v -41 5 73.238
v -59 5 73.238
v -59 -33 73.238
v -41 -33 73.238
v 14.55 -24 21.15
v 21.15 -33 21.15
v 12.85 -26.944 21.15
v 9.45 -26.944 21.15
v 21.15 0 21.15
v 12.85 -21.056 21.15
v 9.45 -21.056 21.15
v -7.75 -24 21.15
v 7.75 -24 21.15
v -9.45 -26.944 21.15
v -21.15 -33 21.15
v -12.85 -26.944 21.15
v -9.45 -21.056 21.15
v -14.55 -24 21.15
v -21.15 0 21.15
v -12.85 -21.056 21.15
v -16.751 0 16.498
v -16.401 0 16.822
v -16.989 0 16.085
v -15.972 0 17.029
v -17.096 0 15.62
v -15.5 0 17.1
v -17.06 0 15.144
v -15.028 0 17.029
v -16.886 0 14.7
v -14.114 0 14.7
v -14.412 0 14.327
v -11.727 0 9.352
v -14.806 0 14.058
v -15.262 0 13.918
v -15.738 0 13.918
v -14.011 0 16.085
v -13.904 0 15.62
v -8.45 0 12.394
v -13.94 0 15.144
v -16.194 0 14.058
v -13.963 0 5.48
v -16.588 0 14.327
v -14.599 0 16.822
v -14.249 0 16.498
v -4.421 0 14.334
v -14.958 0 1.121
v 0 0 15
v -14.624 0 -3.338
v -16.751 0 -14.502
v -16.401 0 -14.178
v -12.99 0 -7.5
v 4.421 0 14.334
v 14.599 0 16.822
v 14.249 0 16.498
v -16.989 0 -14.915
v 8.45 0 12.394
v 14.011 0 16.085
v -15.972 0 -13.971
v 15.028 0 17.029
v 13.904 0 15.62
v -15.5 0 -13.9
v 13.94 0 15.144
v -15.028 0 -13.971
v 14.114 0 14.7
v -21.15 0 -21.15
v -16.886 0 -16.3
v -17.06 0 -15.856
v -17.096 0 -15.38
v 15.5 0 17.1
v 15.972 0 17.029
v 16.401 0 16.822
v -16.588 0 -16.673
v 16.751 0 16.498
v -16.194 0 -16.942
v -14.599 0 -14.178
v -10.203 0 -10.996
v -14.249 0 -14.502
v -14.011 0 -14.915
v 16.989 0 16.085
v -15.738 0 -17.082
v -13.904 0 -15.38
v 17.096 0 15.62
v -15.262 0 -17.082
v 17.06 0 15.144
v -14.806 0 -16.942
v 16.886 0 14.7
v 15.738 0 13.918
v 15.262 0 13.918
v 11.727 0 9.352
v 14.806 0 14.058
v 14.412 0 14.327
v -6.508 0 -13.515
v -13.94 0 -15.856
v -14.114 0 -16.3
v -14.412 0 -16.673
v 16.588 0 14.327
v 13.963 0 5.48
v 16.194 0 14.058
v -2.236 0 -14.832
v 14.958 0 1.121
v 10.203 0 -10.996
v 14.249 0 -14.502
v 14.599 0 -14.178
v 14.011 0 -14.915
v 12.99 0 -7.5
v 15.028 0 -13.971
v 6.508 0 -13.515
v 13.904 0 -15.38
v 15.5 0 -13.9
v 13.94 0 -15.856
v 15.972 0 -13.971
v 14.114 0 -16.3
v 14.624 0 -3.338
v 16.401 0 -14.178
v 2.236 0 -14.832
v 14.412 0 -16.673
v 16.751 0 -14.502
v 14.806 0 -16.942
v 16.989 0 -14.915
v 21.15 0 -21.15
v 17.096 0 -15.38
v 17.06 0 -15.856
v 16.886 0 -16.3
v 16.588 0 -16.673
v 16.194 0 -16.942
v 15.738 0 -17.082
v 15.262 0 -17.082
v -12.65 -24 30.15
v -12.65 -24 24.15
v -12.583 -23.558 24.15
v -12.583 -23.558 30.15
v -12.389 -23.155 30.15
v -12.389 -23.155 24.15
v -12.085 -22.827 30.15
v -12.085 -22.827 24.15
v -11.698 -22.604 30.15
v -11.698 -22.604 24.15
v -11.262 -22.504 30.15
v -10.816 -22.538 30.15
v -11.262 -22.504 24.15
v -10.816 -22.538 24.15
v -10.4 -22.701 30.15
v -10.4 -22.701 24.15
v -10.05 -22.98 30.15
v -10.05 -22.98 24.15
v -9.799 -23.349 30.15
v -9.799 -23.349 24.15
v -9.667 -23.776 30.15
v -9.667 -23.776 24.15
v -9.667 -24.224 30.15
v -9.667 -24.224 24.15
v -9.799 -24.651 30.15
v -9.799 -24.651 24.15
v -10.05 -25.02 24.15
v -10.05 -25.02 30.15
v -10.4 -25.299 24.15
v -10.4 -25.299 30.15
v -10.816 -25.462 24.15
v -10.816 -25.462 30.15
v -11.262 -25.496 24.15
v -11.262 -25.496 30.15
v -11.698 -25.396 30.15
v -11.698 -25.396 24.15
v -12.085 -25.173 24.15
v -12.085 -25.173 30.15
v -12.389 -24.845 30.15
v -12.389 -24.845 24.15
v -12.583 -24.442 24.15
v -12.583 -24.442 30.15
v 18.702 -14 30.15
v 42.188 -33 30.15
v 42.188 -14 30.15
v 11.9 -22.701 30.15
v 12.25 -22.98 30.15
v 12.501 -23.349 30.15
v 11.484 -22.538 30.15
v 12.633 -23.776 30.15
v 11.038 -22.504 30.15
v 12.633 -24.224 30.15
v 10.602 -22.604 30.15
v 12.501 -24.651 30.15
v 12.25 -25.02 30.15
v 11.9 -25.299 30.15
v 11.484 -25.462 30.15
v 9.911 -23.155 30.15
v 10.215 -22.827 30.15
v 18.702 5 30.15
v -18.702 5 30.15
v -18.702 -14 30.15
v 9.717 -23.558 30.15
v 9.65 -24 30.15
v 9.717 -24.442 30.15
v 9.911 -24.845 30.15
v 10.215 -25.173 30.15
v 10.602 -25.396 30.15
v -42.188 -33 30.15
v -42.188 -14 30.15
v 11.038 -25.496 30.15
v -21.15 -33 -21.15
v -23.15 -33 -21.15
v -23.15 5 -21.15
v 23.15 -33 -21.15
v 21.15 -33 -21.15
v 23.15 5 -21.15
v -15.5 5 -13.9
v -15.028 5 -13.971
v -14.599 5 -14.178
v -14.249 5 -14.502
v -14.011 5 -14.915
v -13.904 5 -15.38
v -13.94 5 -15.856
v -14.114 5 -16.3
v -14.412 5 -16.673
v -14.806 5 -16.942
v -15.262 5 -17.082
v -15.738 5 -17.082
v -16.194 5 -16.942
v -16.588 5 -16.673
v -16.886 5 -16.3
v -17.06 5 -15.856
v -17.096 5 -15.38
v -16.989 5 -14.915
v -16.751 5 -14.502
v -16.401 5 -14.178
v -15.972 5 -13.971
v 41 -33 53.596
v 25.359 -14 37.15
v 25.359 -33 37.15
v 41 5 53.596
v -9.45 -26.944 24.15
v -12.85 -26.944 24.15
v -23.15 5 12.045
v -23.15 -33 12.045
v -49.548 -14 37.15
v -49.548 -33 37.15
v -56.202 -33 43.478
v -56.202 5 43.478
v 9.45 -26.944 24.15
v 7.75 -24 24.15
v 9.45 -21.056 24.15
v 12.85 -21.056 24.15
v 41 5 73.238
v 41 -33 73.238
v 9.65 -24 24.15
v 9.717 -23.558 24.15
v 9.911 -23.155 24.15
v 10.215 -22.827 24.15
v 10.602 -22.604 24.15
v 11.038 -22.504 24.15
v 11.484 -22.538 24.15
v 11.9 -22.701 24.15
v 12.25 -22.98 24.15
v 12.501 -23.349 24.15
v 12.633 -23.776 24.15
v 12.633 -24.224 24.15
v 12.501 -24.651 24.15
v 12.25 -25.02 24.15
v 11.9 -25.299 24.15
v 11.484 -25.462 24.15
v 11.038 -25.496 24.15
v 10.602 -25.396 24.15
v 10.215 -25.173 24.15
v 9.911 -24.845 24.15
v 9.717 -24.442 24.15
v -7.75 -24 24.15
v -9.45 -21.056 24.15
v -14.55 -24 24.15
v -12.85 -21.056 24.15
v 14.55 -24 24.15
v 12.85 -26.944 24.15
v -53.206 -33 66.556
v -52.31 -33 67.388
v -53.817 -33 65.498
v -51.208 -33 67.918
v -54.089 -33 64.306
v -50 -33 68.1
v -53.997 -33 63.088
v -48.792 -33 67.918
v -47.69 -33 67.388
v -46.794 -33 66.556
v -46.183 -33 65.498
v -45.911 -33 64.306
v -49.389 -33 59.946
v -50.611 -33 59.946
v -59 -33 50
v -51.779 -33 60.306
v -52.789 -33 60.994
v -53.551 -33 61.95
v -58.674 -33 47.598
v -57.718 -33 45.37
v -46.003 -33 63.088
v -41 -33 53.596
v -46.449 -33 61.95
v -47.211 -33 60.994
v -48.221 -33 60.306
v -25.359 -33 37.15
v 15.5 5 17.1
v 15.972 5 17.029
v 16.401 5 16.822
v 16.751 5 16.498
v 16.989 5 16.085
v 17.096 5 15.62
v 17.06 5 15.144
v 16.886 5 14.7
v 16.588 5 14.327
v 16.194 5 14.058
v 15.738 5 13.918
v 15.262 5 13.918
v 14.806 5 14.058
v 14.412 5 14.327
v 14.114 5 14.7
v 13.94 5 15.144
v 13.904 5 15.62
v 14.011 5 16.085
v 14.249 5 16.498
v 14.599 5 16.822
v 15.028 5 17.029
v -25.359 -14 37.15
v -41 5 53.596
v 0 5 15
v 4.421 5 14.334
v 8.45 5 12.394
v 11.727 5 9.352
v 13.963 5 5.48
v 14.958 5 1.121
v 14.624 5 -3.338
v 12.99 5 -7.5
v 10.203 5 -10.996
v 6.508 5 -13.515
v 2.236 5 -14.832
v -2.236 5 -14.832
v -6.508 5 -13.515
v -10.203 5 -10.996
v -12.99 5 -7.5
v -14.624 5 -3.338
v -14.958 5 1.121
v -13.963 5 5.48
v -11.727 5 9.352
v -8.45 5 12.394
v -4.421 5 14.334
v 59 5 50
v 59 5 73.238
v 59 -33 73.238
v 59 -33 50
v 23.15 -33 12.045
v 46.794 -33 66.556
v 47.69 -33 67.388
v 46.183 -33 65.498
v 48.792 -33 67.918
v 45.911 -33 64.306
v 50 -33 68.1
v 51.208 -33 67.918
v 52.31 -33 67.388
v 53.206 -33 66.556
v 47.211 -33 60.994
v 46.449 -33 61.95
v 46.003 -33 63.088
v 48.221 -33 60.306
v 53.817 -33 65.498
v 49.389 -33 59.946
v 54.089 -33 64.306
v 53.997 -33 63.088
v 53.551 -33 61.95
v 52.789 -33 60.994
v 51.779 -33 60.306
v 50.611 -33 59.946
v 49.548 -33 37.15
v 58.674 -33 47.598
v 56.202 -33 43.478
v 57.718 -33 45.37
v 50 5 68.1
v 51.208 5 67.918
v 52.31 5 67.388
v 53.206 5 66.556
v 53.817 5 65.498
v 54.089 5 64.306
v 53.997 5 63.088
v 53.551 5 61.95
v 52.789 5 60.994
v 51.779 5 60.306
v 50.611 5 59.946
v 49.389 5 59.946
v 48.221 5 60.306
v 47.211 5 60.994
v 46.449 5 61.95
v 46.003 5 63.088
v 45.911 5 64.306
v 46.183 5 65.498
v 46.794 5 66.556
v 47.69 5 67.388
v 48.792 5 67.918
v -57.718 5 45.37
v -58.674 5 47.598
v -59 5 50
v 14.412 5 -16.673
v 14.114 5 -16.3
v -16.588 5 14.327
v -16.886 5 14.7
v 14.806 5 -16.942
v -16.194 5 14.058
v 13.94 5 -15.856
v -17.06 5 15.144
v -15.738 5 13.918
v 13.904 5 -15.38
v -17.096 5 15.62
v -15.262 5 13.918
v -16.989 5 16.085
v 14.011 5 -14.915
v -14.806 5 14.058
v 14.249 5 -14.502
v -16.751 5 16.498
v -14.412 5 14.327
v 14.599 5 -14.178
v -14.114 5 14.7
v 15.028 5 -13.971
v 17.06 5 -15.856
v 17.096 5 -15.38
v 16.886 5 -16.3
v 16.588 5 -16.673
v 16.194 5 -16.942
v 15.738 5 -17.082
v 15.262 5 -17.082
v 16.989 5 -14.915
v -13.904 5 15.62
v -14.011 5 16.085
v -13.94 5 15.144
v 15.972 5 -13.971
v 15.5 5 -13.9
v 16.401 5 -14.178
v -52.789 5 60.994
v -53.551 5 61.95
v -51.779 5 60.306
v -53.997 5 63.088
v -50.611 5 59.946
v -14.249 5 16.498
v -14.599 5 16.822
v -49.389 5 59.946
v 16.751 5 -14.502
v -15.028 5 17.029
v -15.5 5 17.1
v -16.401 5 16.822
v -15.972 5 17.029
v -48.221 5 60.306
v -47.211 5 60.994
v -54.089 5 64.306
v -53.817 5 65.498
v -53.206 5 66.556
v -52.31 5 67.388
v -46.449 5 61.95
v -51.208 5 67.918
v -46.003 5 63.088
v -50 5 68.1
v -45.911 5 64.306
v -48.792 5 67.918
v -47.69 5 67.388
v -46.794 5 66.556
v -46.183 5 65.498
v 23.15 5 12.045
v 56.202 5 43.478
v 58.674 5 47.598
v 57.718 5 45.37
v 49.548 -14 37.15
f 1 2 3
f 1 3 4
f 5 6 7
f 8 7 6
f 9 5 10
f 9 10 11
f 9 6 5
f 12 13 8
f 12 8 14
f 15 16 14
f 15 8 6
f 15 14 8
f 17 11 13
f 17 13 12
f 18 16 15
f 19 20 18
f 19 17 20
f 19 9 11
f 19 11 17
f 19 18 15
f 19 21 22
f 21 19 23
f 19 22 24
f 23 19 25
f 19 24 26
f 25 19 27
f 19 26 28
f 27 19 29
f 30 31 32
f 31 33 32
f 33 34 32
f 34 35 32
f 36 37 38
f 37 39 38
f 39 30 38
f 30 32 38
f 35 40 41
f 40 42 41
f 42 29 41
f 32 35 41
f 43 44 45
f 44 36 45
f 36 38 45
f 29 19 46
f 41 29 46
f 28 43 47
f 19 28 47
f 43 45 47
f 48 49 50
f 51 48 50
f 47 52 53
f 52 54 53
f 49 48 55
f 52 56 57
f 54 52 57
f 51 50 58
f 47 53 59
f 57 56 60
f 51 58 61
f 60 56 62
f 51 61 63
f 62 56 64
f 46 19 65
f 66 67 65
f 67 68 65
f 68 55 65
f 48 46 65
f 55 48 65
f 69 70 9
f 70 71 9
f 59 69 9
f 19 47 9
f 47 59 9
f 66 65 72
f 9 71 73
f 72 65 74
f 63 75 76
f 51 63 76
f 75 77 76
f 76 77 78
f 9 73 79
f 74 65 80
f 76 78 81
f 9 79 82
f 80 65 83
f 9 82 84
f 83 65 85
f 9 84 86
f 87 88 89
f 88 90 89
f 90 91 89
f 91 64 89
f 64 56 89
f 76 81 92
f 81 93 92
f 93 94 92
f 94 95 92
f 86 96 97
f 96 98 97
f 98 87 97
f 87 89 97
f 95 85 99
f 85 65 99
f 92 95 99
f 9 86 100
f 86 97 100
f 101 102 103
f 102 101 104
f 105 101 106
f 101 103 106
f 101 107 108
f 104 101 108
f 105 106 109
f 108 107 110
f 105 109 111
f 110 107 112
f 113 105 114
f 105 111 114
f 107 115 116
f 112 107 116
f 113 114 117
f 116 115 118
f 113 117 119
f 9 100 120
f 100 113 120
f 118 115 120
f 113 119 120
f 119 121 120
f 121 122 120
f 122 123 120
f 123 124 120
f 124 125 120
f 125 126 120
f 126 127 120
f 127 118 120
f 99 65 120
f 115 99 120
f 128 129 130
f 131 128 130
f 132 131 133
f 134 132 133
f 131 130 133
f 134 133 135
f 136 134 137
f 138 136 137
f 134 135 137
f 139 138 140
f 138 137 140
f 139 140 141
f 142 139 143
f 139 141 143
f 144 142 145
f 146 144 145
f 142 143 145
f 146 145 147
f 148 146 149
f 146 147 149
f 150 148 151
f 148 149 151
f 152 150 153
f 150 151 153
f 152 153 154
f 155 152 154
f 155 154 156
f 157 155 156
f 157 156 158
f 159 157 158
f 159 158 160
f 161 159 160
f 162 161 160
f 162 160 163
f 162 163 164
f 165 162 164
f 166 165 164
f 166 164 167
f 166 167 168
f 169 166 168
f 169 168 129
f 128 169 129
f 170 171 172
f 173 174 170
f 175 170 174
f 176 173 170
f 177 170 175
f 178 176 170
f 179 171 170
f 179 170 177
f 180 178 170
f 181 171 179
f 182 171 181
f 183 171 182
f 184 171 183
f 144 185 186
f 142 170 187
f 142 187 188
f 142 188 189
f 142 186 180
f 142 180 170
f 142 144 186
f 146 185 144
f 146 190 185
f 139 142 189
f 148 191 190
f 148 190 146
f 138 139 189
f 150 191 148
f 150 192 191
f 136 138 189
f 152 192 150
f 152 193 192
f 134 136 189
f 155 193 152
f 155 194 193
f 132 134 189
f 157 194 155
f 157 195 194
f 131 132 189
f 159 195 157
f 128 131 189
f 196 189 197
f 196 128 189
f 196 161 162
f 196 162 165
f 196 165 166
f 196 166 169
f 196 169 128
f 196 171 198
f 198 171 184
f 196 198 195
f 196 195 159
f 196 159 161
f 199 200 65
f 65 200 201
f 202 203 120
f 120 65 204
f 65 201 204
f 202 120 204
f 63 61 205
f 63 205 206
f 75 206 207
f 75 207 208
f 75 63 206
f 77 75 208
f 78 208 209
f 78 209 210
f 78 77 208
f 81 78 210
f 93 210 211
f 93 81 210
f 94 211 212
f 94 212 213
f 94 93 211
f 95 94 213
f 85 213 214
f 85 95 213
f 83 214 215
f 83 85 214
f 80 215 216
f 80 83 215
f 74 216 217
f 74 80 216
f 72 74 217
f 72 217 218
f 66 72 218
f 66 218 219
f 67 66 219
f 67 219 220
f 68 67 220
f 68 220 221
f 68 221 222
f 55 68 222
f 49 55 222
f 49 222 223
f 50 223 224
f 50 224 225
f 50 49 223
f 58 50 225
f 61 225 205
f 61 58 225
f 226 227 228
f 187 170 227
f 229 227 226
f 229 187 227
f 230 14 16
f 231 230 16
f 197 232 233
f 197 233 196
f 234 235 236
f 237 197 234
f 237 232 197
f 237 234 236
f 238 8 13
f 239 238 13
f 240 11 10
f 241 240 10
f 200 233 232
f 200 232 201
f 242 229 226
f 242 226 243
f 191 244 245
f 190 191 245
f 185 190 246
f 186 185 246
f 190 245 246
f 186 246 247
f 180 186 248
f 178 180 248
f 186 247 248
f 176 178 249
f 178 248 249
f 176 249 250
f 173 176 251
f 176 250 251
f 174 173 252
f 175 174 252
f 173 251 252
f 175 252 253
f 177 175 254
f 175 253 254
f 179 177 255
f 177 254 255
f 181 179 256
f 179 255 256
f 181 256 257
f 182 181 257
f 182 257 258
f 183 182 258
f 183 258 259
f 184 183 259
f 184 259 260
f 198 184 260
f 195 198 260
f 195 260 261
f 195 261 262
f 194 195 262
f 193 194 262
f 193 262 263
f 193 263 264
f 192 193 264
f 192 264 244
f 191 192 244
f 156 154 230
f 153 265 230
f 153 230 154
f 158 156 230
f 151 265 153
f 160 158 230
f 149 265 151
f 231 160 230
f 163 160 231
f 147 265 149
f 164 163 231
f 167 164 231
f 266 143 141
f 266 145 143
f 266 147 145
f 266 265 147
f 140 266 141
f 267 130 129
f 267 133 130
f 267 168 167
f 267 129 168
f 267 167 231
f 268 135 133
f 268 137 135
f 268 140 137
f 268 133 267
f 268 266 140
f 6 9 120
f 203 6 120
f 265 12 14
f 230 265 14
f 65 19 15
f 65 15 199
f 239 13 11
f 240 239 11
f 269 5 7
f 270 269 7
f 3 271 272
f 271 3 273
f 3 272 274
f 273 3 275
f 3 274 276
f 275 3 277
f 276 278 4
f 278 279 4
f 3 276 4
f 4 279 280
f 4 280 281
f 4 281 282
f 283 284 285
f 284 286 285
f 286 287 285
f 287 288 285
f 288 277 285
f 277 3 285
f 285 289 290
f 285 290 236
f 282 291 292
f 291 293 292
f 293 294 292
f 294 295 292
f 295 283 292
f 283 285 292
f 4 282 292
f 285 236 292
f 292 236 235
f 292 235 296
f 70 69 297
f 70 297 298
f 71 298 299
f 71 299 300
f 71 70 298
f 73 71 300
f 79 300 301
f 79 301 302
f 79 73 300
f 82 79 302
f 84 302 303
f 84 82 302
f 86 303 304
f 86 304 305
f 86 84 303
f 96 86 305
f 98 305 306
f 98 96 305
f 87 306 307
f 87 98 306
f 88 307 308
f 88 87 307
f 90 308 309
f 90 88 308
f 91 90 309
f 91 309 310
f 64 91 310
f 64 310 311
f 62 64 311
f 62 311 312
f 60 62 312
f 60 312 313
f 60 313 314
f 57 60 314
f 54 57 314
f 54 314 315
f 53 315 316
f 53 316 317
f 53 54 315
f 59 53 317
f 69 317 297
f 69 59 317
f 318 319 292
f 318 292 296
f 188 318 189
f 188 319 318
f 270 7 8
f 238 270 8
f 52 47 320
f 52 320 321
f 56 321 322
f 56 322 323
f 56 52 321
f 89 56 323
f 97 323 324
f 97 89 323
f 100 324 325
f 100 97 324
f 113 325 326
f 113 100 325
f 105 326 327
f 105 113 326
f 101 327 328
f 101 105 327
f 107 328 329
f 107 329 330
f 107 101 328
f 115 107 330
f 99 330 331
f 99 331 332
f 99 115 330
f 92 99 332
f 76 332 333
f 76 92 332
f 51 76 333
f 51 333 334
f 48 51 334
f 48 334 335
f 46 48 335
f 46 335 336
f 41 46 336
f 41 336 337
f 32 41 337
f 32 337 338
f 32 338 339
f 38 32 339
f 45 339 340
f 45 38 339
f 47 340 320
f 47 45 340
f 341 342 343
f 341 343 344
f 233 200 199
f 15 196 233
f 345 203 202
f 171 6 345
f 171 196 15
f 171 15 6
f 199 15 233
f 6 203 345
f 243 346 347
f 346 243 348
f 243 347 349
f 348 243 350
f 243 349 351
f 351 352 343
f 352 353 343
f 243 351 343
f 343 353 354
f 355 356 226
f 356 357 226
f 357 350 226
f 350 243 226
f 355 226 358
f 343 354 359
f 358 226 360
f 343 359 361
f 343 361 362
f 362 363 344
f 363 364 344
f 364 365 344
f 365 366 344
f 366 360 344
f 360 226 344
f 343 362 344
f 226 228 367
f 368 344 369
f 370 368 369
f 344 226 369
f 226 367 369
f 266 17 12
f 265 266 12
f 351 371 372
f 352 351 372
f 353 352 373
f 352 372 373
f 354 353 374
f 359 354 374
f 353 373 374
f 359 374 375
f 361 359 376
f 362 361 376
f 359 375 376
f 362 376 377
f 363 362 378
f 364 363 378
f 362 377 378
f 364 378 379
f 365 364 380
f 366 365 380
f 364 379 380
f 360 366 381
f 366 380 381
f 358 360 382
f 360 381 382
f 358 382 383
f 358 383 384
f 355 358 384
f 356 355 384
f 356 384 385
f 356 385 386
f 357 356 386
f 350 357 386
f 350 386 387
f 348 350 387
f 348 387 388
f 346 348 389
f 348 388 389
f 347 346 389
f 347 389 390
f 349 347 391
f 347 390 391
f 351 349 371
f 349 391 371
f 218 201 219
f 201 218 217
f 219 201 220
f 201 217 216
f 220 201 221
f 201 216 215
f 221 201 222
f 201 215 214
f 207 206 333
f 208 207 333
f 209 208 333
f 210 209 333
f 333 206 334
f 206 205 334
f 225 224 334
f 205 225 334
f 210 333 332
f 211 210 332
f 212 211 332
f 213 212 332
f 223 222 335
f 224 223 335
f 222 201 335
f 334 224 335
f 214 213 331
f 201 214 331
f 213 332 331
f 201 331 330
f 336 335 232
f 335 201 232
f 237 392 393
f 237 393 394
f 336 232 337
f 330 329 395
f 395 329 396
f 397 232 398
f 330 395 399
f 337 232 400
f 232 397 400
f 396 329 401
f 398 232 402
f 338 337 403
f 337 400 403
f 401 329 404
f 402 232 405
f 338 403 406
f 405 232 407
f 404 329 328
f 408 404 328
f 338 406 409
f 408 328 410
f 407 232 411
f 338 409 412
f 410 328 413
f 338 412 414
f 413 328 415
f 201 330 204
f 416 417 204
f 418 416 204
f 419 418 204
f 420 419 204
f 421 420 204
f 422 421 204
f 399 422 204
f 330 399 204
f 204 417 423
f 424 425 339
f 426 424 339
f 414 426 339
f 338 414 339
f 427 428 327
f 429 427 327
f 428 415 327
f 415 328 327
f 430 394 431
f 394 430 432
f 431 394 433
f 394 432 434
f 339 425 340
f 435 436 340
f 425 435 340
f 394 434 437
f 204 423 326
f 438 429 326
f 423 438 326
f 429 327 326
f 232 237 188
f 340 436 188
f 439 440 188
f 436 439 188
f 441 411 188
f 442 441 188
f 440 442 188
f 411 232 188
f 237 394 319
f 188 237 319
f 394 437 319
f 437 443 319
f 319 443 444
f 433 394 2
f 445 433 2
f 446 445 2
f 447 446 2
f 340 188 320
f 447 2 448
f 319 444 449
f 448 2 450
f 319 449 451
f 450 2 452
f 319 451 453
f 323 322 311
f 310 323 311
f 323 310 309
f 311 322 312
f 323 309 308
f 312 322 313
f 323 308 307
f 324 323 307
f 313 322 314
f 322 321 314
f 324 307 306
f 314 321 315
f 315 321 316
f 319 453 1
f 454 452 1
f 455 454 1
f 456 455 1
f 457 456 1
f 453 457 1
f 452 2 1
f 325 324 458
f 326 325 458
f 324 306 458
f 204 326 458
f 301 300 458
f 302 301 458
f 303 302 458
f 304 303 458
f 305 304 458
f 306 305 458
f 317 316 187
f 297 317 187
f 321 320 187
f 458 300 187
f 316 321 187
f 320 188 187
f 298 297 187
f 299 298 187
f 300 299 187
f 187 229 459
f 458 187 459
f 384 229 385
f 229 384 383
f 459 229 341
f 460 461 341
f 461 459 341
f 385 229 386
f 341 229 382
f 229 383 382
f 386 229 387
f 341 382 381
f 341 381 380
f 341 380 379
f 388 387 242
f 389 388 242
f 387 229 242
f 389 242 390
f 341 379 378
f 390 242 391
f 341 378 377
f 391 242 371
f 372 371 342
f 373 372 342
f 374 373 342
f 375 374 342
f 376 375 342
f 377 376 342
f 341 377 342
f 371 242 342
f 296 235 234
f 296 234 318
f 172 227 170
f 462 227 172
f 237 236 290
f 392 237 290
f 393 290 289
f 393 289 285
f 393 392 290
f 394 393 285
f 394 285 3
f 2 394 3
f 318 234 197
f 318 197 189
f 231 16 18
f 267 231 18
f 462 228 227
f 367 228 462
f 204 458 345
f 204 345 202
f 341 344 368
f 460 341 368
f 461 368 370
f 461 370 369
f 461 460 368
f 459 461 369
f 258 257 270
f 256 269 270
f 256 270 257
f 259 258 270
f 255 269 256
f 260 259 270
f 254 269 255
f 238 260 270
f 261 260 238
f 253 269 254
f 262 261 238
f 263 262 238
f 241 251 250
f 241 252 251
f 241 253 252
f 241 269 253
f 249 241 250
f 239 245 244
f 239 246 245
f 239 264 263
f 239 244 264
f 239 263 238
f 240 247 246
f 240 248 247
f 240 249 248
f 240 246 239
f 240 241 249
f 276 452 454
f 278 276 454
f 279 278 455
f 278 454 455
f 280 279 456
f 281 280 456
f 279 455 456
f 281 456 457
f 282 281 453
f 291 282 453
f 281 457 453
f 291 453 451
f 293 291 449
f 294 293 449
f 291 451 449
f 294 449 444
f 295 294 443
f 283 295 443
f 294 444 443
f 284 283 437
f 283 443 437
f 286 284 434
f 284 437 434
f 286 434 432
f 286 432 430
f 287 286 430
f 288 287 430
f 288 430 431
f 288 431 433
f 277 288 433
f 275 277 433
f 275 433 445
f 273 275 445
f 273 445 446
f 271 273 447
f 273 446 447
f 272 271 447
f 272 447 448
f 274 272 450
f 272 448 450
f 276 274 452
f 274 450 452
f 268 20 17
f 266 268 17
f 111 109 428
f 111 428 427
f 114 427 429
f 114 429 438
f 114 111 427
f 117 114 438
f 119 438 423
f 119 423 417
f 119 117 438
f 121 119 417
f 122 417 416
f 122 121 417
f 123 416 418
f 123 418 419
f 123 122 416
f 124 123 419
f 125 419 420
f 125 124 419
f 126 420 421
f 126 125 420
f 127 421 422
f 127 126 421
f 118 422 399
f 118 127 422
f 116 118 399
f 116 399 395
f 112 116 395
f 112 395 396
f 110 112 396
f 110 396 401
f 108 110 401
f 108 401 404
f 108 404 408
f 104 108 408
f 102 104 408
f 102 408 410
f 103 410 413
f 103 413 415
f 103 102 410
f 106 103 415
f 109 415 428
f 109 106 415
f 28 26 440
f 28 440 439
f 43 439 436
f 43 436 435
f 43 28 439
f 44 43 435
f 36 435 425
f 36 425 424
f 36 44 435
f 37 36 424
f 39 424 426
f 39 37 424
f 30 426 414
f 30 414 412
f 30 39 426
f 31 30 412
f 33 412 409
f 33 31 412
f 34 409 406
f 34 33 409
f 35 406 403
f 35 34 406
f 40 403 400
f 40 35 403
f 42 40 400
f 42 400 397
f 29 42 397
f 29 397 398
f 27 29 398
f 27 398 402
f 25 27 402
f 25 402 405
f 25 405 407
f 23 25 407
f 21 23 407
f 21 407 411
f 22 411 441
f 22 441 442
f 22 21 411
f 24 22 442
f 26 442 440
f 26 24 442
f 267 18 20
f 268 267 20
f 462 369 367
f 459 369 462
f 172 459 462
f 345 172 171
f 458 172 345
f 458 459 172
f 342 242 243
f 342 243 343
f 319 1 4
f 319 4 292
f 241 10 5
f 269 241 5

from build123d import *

# Parameters (mm, degrees)
SKETCH_6_W          = 42.3
SKETCH_6_H          = 42.3
SKETCH_6_R          = 1.6
SKETCH_6_R_2        = 15
EXTRUDE_1_DEPTH     = 5
SKETCH_7_R          = 4.1
EXTRUDE_5_DEPTH     = 38
EXTRUDE_START       = 38
SKETCH_7_7_R        = 4.1
EXTRUDE_7_DEPTH     = 38
SKETCH_7_8_R        = 4.1
EXTRUDE_8_DEPTH     = 38
SKETCH_12_W         = 2
SKETCH_12_H         = 44.3
EXTRUDE_11_DEPTH    = 38
SKETCH_14_W         = 44.3
SKETCH_14_H         = 2
EXTRUDE_12_DEPTH    = 38
SKETCH_15_W         = 2
SKETCH_15_H         = 42.3
EXTRUDE_13_DEPTH    = 38
SKETCH_17_W         = 122.95750499
SKETCH_17_H         = 7
CUT_EXTRUDE_1_DEPTH = 19
EXTRUDE_14_DEPTH    = 38
CUT_EXTRUDE_3_DEPTH = 3
SKETCH_22_R         = 1.5
CUT_EXTRUDE_4_DEPTH = 10


with BuildPart() as part:
    # 草图6 → 凸台-拉伸1 (new body)
    with BuildSketch(Plane(origin=(0, 0, 0), x_dir=(1, 0, 0), z_dir=(0, 1, 0))):
        Rectangle(SKETCH_6_W, SKETCH_6_H)
        with Locations(Location((15.5, 15.5, 0), (0, 0, 270))):
            Circle(SKETCH_6_R, mode=Mode.SUBTRACT)
        with Locations(Location((-15.5, 15.5, 0), (0, 0, 270))):
            Circle(SKETCH_6_R, mode=Mode.SUBTRACT)
        with Locations(Location((-15.5, -15.5, 0), (0, 0, 270))):
            Circle(SKETCH_6_R, mode=Mode.SUBTRACT)
        with Locations(Location((15.5, -15.5, 0), (0, 0, 270))):
            Circle(SKETCH_6_R, mode=Mode.SUBTRACT)
        with Locations(Location((0, 0, 0), (0, 0, 270))):
            Circle(SKETCH_6_R_2, mode=Mode.SUBTRACT)
    extrude(amount=EXTRUDE_1_DEPTH)

    # 草图7 → 凸台-拉伸5 (add)
    # profile 1 of 2: a face of its own
    with BuildSketch(Plane(origin=(0, 5, 0), x_dir=(1, 0, 0), z_dir=(0, 1, 0))):
        with BuildLine():
            Line((-41, -53.596295528), (-10.142654247, -21.15))
            Line((-10.142654247, -21.15), (-21.15, -21.15))
            Line((-21.15, -21.15), (-21.15, -10.142654247))
            Line((-21.15, -10.142654247), (-56.202269248, -43.478354795))
            ThreePointArc((-56.202269248, -43.478354795), (-58.271046585, -46.45179082), (-59, -50))
            Line((-59, -50), (-59, -73.238133914))
            Line((-59, -73.238133914), (-41, -73.238133914))
            Line((-41, -73.238133914), (-41, -53.596295528))
        make_face()
        with Locations(Location((-50, -64, 0), (0, 0, 270))):
            Circle(SKETCH_7_R, mode=Mode.SUBTRACT)
    # profile 2 of 2: a face of its own
    with BuildSketch(Plane(origin=(0, 5, 0), x_dir=(1, 0, 0), z_dir=(0, 1, 0))):
        with BuildLine():
            Line((21.15, -21.15), (10.142654247, -21.15))
            Line((10.142654247, -21.15), (41, -53.596295528))
            Line((41, -53.596295528), (41, -73.238133914))
            Line((41, -73.238133914), (59, -73.238133914))
            Line((59, -73.238133914), (59, -50))
            ThreePointArc((59, -50), (58.271046585, -46.45179082), (56.202269248, -43.478354795))
            Line((56.202269248, -43.478354795), (21.15, -10.142654247))
            Line((21.15, -10.142654247), (21.15, -21.15))
        make_face()
        with Locations(Location((50, -64, 0), (0, 0, 270))):
            Circle(SKETCH_7_R, mode=Mode.SUBTRACT)
    extrude(amount=-EXTRUDE_5_DEPTH)

    # 草图7<7> → 凸台-拉伸7 (add)
    with BuildSketch(Plane(origin=(0, 5, 0), x_dir=(1, 0, 0), z_dir=(0, 1, 0)).offset(EXTRUDE_START)):
        with Locations(Location((-50, -64, 0), (0, 0, 270))):
            Circle(SKETCH_7_7_R)
        with Locations(Location((50, -64, 0), (0, 0, 270))):
            Circle(SKETCH_7_7_R)
    extrude(amount=-EXTRUDE_7_DEPTH)


with BuildPart() as extrude_7_kept_piece:
    # of the separate pieces the step leaves, the one the design keeps (extrude_7_pieces_kept)
    add(part.part.solids().sort_by_distance((-10.142654247, 0, 21.15))[0])

    # 草图7<8> → 凸台-拉伸8 (add)
    with BuildSketch(Plane(origin=(0, 5, 0), x_dir=(1, 0, 0), z_dir=(0, 1, 0))):
        with Locations(Location((-50, -64, 0), (0, 0, 270))):
            Circle(SKETCH_7_8_R)
        with Locations(Location((50, -64, 0), (0, 0, 270))):
            Circle(SKETCH_7_8_R)
    extrude(amount=EXTRUDE_8_DEPTH)


with BuildPart() as extrude_8_kept_piece:
    # of the separate pieces the step leaves, the one the design keeps (extrude_8_pieces_kept)
    add(extrude_7_kept_piece.part.solids().sort_by_distance((-10.142654247, 0, 21.15))[0])

    # 草图12 → 凸台-拉伸11 (add)
    with BuildSketch(Plane(origin=(0, 5, 0), x_dir=(1, 0, 0), z_dir=(0, 1, 0))):
        with Locations((22.15, -1)):
            Rectangle(SKETCH_12_W, SKETCH_12_H)
    extrude(amount=-EXTRUDE_11_DEPTH)

    # 草图14 → 凸台-拉伸12 (add)
    with BuildSketch(Plane(origin=(0, 5, 0), x_dir=(1, 0, 0), z_dir=(0, 1, 0))):
        with Locations((-1, -22.15)):
            Rectangle(SKETCH_14_W, SKETCH_14_H)
    extrude(amount=-EXTRUDE_12_DEPTH)

    # 草图15 → 凸台-拉伸13 (add)
    with BuildSketch(Plane(origin=(0, 5, 0), x_dir=(1, 0, 0), z_dir=(0, 1, 0))):
        with Locations((-22.15, 0)):
            Rectangle(SKETCH_15_W, SKETCH_15_H)
    extrude(amount=-EXTRUDE_13_DEPTH)

    # 草图17 → 切除-拉伸1 (cut)
    with BuildSketch(Plane.XZ.offset(33)):
        with Locations((-0.358433095, 33.65)):
            Rectangle(SKETCH_17_W, SKETCH_17_H)
    extrude(amount=-CUT_EXTRUDE_1_DEPTH, mode=Mode.SUBTRACT)

    # 草图21 → 凸台-拉伸14 (add)
    with BuildSketch(Plane.XZ.offset(33)):
        Polygon((18.701909079, 30.15), (-18.701909079, 30.15), (-12.044710877, 23.15), (12.044710877, 23.15), align=None)
    extrude(amount=-EXTRUDE_14_DEPTH)

    # 草图20 → 切除-拉伸3 (cut)
    with BuildSketch(Plane(origin=(0, 0, 21.15), x_dir=(-1, 0, 0), z_dir=(0, 0, -1))):
        Polygon((-7.75, -24), (-9.45, -21.055513627), (-12.85, -21.055513627), (-14.55, -24), (-12.85, -26.944486373), (-9.45, -26.944486373), align=None)
        Polygon((14.55, -24), (12.85, -21.055513627), (9.45, -21.055513627), (7.75, -24), (9.45, -26.944486373), (12.85, -26.944486373), align=None)
    extrude(amount=-CUT_EXTRUDE_3_DEPTH, mode=Mode.SUBTRACT)

    # 草图22 → 切除-拉伸4 (cut)
    with BuildSketch(Plane(origin=(0, 0, 21.15), x_dir=(-1, 0, 0), z_dir=(0, 0, -1))):
        with Locations((11.15, -24)):
            Circle(SKETCH_22_R)
        with Locations((-11.15, -24)):
            Circle(SKETCH_22_R)
    extrude(amount=-CUT_EXTRUDE_4_DEPTH, mode=Mode.SUBTRACT)


solid = extrude_8_kept_piece.part
